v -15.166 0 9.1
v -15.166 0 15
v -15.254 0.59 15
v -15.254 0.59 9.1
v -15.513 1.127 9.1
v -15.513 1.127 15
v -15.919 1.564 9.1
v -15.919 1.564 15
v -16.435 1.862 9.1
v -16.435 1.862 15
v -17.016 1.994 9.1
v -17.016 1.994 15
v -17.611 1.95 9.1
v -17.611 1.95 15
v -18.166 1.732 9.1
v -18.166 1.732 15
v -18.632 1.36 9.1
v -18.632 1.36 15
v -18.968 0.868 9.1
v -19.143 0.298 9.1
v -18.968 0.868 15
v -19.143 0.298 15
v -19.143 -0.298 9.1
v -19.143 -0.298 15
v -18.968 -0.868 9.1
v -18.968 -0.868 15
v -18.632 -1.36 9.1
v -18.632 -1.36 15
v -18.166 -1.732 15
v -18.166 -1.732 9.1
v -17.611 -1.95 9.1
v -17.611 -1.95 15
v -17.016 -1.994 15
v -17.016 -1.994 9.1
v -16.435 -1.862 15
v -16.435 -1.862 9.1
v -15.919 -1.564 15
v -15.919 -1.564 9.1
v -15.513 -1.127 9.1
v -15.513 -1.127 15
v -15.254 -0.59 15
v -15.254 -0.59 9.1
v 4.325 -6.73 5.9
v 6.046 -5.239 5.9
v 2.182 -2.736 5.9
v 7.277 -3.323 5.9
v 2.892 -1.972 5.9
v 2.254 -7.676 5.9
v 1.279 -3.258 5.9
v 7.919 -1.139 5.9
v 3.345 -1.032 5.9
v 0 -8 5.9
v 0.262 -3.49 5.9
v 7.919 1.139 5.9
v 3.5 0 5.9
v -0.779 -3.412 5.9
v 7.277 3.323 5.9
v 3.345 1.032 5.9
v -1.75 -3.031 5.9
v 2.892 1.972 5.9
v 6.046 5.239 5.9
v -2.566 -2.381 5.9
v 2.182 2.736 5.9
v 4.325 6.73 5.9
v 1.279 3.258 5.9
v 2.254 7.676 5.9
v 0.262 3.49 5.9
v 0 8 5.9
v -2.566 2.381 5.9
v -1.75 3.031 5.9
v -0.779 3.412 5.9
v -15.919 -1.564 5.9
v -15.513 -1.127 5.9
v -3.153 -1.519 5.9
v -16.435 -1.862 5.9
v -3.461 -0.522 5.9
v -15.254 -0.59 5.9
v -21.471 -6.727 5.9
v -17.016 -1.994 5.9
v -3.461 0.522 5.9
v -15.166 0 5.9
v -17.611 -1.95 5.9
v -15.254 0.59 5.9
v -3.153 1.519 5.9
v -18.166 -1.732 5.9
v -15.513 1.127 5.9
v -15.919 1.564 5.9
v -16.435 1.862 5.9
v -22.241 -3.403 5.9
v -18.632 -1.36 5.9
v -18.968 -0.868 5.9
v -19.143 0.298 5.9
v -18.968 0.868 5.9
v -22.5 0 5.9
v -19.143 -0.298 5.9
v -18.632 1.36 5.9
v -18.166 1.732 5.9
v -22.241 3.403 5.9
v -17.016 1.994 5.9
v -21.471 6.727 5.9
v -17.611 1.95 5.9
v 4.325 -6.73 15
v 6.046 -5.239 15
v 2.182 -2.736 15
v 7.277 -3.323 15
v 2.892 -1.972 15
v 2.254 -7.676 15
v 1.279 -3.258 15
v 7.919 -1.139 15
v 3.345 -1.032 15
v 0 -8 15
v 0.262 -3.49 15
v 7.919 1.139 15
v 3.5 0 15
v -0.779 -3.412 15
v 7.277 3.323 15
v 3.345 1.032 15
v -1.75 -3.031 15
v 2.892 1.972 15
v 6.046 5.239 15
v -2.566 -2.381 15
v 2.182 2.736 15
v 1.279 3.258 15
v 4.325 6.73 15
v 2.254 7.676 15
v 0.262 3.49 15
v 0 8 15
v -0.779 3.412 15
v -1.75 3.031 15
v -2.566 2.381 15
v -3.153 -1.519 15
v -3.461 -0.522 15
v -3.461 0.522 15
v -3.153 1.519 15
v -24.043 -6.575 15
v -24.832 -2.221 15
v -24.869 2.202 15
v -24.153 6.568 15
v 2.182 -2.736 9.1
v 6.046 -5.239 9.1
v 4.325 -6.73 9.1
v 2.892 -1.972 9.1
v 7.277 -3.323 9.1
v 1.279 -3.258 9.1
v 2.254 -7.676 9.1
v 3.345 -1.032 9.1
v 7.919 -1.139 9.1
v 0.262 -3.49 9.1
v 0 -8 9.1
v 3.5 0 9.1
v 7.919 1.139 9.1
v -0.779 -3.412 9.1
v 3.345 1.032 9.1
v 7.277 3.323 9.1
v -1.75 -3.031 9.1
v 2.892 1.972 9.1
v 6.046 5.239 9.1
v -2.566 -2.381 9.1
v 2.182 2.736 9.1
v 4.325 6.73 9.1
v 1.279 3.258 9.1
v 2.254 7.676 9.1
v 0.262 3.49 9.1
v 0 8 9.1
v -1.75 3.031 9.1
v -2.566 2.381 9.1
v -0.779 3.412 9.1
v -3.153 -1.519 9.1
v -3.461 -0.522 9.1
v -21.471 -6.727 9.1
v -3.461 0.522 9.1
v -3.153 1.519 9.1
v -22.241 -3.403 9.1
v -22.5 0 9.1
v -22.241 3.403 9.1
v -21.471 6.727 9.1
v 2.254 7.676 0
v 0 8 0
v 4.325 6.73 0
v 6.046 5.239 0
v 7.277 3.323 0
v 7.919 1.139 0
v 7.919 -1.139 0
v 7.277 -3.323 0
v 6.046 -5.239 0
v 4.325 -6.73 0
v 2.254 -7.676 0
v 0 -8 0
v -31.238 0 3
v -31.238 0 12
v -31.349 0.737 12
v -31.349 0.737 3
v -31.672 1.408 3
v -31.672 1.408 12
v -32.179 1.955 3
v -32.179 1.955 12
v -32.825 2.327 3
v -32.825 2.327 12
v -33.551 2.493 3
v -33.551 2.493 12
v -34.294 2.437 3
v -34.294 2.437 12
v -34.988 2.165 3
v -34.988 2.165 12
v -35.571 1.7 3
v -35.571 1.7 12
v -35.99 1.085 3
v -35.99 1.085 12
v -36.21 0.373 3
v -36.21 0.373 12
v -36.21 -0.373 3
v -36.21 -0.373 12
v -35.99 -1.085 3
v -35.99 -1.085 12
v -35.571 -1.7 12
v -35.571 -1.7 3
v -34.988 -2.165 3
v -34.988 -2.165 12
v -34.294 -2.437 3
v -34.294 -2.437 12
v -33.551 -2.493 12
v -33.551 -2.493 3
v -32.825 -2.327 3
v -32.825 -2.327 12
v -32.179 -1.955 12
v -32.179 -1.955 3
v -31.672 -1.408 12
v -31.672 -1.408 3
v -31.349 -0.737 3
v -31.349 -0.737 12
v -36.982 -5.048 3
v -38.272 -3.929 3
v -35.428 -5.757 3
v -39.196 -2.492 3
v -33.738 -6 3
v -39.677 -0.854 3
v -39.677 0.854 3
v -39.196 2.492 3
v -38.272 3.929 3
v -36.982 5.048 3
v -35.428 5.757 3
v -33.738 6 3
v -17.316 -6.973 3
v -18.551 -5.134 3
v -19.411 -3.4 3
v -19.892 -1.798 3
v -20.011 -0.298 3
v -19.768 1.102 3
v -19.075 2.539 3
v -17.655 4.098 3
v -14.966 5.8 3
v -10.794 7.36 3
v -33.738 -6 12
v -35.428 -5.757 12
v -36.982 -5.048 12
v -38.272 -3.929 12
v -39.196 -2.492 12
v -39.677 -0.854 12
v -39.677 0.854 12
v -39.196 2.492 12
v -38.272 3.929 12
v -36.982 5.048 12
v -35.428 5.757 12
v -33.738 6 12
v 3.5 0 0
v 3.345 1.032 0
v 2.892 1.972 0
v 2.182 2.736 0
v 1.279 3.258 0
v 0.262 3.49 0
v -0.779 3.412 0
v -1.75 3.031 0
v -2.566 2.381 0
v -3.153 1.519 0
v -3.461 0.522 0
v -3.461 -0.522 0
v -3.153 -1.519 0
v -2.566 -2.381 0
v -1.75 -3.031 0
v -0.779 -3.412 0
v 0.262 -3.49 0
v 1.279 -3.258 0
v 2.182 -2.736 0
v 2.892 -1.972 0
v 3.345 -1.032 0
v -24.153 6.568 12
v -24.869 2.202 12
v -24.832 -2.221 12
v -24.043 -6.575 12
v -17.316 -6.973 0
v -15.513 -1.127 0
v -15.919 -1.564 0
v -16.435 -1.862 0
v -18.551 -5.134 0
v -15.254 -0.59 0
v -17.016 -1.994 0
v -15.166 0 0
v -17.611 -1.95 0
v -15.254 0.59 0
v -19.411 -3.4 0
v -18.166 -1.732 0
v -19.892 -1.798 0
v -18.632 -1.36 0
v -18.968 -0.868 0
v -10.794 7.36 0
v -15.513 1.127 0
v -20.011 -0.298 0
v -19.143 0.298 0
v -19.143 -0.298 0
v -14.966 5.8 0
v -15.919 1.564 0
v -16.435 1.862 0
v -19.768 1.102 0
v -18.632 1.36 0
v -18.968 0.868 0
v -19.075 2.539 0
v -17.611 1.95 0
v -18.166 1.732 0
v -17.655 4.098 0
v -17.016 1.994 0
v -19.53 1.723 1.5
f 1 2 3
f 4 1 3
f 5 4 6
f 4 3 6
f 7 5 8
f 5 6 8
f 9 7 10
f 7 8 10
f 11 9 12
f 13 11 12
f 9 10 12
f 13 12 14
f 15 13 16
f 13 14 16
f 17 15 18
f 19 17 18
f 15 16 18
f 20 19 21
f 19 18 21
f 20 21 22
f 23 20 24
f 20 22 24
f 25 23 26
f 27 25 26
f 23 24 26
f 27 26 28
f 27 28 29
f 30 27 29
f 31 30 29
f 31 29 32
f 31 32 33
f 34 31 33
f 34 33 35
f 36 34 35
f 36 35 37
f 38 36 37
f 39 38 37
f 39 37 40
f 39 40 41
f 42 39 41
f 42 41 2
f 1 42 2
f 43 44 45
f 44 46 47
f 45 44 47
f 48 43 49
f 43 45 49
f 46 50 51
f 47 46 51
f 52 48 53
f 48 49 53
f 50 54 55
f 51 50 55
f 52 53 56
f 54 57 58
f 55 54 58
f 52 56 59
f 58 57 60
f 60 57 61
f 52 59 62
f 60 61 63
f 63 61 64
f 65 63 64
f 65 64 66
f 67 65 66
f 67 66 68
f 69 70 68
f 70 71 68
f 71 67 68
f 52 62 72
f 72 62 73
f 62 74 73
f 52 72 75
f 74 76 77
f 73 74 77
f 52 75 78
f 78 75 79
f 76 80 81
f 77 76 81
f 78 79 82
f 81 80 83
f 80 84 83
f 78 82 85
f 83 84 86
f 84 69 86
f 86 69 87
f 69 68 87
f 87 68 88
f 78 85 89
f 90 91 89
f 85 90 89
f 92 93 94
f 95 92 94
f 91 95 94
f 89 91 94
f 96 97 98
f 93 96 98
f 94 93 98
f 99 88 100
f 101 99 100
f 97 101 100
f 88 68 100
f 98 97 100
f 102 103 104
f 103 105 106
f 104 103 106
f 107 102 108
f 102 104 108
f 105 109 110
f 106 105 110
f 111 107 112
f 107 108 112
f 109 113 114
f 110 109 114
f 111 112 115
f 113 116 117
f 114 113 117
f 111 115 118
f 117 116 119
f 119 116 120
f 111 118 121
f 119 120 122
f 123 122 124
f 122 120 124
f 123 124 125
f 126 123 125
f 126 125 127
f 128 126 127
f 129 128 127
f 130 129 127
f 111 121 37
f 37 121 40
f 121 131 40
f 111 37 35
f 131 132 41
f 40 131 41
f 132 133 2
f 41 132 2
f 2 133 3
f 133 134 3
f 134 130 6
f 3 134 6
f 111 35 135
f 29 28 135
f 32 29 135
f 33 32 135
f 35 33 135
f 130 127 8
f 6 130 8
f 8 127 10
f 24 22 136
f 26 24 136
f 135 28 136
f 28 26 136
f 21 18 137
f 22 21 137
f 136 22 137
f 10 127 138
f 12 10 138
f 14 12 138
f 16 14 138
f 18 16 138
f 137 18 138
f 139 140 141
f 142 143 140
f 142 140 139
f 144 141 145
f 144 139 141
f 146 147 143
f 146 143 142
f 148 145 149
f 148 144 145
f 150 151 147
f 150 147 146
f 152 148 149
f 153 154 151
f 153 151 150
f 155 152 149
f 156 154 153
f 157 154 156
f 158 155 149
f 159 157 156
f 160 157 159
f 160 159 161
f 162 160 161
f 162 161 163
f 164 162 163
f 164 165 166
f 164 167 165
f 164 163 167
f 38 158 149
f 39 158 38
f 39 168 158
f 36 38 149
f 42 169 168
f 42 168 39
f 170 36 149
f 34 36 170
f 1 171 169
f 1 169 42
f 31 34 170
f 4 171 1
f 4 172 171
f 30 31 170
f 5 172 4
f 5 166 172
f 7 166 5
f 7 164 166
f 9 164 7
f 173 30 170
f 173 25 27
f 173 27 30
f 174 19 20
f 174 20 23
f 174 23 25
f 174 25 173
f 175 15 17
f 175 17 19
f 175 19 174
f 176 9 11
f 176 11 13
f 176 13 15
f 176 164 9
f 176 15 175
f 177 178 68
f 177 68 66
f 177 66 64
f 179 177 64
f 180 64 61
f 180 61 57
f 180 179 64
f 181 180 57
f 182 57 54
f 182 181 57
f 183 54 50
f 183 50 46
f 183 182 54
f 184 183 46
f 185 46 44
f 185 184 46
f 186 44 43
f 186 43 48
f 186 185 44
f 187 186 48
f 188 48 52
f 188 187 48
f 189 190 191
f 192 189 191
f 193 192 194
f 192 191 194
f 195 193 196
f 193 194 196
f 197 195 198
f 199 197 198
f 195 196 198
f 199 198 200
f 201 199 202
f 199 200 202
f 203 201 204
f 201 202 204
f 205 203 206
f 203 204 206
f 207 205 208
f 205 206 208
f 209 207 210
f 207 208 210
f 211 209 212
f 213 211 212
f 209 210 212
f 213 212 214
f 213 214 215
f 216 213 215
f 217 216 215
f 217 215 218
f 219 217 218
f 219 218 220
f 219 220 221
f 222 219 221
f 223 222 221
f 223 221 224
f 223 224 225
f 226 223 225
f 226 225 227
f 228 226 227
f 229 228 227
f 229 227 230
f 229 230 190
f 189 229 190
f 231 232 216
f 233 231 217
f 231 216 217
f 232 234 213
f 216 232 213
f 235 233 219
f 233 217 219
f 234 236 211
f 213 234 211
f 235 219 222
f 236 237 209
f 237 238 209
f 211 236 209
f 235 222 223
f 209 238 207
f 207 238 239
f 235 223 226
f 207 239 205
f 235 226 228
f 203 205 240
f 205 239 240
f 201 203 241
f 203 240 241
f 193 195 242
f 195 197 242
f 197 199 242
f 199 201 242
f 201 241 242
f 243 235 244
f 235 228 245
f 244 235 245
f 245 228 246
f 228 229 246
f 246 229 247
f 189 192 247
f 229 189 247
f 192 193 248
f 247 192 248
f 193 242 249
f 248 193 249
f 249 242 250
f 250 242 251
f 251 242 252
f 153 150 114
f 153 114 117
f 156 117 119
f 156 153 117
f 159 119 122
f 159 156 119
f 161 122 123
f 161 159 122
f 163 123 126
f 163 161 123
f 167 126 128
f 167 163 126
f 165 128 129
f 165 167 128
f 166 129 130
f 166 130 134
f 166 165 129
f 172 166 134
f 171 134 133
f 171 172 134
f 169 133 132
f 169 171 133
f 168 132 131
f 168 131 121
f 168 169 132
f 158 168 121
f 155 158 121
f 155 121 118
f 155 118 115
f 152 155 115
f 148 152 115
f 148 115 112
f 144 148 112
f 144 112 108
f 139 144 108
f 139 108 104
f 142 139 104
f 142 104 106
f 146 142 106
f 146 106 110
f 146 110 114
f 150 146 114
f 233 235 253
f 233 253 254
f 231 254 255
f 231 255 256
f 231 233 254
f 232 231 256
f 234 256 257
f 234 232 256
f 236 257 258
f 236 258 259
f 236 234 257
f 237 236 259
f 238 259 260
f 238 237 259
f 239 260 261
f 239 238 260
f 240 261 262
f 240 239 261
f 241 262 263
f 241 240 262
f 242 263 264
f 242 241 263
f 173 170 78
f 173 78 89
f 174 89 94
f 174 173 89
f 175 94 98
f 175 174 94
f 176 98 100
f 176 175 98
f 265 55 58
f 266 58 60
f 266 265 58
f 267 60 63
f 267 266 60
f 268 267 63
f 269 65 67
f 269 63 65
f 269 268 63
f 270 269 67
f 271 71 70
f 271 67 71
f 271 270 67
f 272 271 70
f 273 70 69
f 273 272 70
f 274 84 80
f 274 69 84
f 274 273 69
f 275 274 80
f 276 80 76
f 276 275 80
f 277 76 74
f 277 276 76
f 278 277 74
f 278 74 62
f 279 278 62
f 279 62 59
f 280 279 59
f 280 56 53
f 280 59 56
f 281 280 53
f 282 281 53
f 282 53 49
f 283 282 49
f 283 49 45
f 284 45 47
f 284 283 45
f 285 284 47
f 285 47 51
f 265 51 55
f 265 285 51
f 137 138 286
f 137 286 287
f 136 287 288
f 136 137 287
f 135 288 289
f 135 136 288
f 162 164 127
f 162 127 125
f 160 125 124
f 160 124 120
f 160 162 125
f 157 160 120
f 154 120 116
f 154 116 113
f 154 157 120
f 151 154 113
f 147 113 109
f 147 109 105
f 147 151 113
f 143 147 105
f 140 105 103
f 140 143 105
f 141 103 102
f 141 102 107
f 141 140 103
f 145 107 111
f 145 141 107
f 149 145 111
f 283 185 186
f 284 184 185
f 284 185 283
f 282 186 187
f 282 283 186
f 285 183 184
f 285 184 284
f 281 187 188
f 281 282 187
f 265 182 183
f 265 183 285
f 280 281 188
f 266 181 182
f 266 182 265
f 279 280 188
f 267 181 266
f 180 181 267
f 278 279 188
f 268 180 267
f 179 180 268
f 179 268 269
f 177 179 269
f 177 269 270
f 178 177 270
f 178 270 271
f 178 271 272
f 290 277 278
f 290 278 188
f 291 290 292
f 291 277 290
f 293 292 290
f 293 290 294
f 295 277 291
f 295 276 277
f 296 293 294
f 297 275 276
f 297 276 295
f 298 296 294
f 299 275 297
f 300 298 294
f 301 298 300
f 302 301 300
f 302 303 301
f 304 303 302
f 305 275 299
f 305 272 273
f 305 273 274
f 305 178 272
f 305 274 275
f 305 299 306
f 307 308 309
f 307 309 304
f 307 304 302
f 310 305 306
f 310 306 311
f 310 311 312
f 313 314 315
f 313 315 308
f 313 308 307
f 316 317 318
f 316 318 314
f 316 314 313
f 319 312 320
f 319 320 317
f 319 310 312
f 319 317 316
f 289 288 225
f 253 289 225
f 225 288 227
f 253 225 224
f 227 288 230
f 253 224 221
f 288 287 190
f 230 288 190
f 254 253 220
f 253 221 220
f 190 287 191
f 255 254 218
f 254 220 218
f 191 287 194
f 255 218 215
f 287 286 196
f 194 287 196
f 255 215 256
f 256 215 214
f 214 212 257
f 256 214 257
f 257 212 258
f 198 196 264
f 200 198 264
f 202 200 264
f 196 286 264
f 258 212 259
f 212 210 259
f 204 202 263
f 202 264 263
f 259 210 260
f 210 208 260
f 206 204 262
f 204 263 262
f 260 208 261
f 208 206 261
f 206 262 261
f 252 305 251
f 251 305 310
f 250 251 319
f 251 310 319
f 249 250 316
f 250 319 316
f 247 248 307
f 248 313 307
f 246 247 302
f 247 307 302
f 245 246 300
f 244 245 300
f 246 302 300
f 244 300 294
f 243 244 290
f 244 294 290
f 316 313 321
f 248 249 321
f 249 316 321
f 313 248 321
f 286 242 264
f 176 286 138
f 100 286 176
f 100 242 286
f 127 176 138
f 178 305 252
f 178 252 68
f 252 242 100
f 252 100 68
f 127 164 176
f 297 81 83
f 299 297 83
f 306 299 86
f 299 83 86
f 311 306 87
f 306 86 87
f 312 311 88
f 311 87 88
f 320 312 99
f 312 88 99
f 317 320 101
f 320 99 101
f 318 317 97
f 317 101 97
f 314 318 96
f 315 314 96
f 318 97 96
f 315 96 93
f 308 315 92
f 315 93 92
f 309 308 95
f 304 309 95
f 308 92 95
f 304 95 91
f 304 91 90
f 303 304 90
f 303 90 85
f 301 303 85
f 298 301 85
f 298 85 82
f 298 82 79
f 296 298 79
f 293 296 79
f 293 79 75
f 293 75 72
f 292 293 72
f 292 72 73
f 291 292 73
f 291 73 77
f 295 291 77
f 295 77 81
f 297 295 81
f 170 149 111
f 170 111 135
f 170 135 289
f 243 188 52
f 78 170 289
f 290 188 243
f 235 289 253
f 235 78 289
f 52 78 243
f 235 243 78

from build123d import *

# Parameters (mm, degrees)
SKETCH_1_R          = 3.5
EXTRUDE_1_DEPTH     = 15
CUT_EXTRUDE_1_DEPTH = 3.2
CUT_EXTRUDE_2_DEPTH = 3
CUT_EXTRUDE_3_DEPTH = 3
SKETCH_5_R          = 2.5
CUT_EXTRUDE_4_DEPTH = 15
SKETCH_6_R          = 2
CUT_EXTRUDE_5_DEPTH = 15


with BuildPart() as part:
    # Эскиз1 → Вытянуть1 (new body)
    with BuildSketch(Plane.XY):
        with BuildLine():
            Line((-33.737889323, 6), (0, 8))
            ThreePointArc((0, 8), (8, 0), (0, -8))
            Line((0, -8), (-33.737889323, -6))
            ThreePointArc((-33.737889323, -6), (-39.737889323, 0), (-33.737889323, 6))
        make_face()
        Circle(SKETCH_1_R, mode=Mode.SUBTRACT)
    extrude(amount=EXTRUDE_1_DEPTH)

    # Эскиз2 → Вырез-Вытянуть1 (cut)
    with BuildSketch(Plane.XY.offset(9.1)):
        with BuildLine():
            Line((-21.470788926, 6.727200228), (-0.649375953, 7.973600872))
            Line((-0.649375953, 7.973600872), (-0.649375953, 12.464774984))
            Line((-0.649375953, 12.464774984), (11.53167748, 12.464774984))
            Line((11.53167748, 12.464774984), (11.53167748, -11.583586667))
            Line((11.53167748, -11.583586667), (-0.649375953, -11.583586667))
            Line((-0.649375953, -11.583586667), (-0.649375953, -7.973600872))
            Line((-0.649375953, -7.973600872), (-21.470788926, -6.727200228))
            ThreePointArc((-21.470788926, -6.727200228), (-22.5, 0), (-21.470788926, 6.727200228))
        make_face()
    extrude(amount=-CUT_EXTRUDE_1_DEPTH, mode=Mode.SUBTRACT)

    # Эскиз3 → Вырез-Вытянуть2 (cut)
    with BuildSketch(Plane.XY.offset(15)):
        with BuildLine():
            Line((-58.585224431, 9.320685439), (-23.289981774, 9.320685439))
            ThreePointArc((-23.289981774, 9.320685439), (-24.945775434, 0.205603355), (-23.289981774, -8.909478729))
            Line((-23.289981774, -8.909478729), (-58.585224431, -8.909478729))
            Line((-58.585224431, -8.909478729), (-58.585224431, 9.320685439))
        make_face()
    extrude(amount=-CUT_EXTRUDE_2_DEPTH, mode=Mode.SUBTRACT)

    # Эскиз4 → Вырез-Вытянуть3 (cut)
    with BuildSketch(Plane(origin=(0, 0, 0), x_dir=(-1, 0, 0), z_dir=(0, 0, -1))):
        with BuildLine():
            Line((7.501860508, 8.168918957), (7.501860508, 9.225490058))
            Line((7.501860508, 9.225490058), (56.423561983, 9.225490058))
            Line((56.423561983, 9.225490058), (56.423561983, -10.745771297))
            Line((56.423561983, -10.745771297), (16.608517708, -10.745771297))
            Line((16.608517708, -10.745771297), (16.608517708, -7.871583169))
            add(Edge.make_bspline(
                [(7.501860508, 8.168918957), (26.545638359, 4.198485706), (16.608517708, -7.871583169)],
                knots=[0, 0, 0, 1, 1, 1], degree=2))
        make_face()
    extrude(amount=-CUT_EXTRUDE_3_DEPTH, mode=Mode.SUBTRACT)

    # Эскиз5 → Вырез-Вытянуть4 (cut)
    with BuildSketch(Plane.XY.offset(12)):
        with Locations((-33.737889323, 0)):
            Circle(SKETCH_5_R)
    extrude(amount=-CUT_EXTRUDE_4_DEPTH, mode=Mode.SUBTRACT)

    # Эскиз6 → Вырез-Вытянуть5 (cut)
    with BuildSketch(Plane.XY.offset(15)):
        with Locations((-17.165585922, 0)):
            Circle(SKETCH_6_R)
    extrude(amount=-CUT_EXTRUDE_5_DEPTH, mode=Mode.SUBTRACT)


solid = part.part
